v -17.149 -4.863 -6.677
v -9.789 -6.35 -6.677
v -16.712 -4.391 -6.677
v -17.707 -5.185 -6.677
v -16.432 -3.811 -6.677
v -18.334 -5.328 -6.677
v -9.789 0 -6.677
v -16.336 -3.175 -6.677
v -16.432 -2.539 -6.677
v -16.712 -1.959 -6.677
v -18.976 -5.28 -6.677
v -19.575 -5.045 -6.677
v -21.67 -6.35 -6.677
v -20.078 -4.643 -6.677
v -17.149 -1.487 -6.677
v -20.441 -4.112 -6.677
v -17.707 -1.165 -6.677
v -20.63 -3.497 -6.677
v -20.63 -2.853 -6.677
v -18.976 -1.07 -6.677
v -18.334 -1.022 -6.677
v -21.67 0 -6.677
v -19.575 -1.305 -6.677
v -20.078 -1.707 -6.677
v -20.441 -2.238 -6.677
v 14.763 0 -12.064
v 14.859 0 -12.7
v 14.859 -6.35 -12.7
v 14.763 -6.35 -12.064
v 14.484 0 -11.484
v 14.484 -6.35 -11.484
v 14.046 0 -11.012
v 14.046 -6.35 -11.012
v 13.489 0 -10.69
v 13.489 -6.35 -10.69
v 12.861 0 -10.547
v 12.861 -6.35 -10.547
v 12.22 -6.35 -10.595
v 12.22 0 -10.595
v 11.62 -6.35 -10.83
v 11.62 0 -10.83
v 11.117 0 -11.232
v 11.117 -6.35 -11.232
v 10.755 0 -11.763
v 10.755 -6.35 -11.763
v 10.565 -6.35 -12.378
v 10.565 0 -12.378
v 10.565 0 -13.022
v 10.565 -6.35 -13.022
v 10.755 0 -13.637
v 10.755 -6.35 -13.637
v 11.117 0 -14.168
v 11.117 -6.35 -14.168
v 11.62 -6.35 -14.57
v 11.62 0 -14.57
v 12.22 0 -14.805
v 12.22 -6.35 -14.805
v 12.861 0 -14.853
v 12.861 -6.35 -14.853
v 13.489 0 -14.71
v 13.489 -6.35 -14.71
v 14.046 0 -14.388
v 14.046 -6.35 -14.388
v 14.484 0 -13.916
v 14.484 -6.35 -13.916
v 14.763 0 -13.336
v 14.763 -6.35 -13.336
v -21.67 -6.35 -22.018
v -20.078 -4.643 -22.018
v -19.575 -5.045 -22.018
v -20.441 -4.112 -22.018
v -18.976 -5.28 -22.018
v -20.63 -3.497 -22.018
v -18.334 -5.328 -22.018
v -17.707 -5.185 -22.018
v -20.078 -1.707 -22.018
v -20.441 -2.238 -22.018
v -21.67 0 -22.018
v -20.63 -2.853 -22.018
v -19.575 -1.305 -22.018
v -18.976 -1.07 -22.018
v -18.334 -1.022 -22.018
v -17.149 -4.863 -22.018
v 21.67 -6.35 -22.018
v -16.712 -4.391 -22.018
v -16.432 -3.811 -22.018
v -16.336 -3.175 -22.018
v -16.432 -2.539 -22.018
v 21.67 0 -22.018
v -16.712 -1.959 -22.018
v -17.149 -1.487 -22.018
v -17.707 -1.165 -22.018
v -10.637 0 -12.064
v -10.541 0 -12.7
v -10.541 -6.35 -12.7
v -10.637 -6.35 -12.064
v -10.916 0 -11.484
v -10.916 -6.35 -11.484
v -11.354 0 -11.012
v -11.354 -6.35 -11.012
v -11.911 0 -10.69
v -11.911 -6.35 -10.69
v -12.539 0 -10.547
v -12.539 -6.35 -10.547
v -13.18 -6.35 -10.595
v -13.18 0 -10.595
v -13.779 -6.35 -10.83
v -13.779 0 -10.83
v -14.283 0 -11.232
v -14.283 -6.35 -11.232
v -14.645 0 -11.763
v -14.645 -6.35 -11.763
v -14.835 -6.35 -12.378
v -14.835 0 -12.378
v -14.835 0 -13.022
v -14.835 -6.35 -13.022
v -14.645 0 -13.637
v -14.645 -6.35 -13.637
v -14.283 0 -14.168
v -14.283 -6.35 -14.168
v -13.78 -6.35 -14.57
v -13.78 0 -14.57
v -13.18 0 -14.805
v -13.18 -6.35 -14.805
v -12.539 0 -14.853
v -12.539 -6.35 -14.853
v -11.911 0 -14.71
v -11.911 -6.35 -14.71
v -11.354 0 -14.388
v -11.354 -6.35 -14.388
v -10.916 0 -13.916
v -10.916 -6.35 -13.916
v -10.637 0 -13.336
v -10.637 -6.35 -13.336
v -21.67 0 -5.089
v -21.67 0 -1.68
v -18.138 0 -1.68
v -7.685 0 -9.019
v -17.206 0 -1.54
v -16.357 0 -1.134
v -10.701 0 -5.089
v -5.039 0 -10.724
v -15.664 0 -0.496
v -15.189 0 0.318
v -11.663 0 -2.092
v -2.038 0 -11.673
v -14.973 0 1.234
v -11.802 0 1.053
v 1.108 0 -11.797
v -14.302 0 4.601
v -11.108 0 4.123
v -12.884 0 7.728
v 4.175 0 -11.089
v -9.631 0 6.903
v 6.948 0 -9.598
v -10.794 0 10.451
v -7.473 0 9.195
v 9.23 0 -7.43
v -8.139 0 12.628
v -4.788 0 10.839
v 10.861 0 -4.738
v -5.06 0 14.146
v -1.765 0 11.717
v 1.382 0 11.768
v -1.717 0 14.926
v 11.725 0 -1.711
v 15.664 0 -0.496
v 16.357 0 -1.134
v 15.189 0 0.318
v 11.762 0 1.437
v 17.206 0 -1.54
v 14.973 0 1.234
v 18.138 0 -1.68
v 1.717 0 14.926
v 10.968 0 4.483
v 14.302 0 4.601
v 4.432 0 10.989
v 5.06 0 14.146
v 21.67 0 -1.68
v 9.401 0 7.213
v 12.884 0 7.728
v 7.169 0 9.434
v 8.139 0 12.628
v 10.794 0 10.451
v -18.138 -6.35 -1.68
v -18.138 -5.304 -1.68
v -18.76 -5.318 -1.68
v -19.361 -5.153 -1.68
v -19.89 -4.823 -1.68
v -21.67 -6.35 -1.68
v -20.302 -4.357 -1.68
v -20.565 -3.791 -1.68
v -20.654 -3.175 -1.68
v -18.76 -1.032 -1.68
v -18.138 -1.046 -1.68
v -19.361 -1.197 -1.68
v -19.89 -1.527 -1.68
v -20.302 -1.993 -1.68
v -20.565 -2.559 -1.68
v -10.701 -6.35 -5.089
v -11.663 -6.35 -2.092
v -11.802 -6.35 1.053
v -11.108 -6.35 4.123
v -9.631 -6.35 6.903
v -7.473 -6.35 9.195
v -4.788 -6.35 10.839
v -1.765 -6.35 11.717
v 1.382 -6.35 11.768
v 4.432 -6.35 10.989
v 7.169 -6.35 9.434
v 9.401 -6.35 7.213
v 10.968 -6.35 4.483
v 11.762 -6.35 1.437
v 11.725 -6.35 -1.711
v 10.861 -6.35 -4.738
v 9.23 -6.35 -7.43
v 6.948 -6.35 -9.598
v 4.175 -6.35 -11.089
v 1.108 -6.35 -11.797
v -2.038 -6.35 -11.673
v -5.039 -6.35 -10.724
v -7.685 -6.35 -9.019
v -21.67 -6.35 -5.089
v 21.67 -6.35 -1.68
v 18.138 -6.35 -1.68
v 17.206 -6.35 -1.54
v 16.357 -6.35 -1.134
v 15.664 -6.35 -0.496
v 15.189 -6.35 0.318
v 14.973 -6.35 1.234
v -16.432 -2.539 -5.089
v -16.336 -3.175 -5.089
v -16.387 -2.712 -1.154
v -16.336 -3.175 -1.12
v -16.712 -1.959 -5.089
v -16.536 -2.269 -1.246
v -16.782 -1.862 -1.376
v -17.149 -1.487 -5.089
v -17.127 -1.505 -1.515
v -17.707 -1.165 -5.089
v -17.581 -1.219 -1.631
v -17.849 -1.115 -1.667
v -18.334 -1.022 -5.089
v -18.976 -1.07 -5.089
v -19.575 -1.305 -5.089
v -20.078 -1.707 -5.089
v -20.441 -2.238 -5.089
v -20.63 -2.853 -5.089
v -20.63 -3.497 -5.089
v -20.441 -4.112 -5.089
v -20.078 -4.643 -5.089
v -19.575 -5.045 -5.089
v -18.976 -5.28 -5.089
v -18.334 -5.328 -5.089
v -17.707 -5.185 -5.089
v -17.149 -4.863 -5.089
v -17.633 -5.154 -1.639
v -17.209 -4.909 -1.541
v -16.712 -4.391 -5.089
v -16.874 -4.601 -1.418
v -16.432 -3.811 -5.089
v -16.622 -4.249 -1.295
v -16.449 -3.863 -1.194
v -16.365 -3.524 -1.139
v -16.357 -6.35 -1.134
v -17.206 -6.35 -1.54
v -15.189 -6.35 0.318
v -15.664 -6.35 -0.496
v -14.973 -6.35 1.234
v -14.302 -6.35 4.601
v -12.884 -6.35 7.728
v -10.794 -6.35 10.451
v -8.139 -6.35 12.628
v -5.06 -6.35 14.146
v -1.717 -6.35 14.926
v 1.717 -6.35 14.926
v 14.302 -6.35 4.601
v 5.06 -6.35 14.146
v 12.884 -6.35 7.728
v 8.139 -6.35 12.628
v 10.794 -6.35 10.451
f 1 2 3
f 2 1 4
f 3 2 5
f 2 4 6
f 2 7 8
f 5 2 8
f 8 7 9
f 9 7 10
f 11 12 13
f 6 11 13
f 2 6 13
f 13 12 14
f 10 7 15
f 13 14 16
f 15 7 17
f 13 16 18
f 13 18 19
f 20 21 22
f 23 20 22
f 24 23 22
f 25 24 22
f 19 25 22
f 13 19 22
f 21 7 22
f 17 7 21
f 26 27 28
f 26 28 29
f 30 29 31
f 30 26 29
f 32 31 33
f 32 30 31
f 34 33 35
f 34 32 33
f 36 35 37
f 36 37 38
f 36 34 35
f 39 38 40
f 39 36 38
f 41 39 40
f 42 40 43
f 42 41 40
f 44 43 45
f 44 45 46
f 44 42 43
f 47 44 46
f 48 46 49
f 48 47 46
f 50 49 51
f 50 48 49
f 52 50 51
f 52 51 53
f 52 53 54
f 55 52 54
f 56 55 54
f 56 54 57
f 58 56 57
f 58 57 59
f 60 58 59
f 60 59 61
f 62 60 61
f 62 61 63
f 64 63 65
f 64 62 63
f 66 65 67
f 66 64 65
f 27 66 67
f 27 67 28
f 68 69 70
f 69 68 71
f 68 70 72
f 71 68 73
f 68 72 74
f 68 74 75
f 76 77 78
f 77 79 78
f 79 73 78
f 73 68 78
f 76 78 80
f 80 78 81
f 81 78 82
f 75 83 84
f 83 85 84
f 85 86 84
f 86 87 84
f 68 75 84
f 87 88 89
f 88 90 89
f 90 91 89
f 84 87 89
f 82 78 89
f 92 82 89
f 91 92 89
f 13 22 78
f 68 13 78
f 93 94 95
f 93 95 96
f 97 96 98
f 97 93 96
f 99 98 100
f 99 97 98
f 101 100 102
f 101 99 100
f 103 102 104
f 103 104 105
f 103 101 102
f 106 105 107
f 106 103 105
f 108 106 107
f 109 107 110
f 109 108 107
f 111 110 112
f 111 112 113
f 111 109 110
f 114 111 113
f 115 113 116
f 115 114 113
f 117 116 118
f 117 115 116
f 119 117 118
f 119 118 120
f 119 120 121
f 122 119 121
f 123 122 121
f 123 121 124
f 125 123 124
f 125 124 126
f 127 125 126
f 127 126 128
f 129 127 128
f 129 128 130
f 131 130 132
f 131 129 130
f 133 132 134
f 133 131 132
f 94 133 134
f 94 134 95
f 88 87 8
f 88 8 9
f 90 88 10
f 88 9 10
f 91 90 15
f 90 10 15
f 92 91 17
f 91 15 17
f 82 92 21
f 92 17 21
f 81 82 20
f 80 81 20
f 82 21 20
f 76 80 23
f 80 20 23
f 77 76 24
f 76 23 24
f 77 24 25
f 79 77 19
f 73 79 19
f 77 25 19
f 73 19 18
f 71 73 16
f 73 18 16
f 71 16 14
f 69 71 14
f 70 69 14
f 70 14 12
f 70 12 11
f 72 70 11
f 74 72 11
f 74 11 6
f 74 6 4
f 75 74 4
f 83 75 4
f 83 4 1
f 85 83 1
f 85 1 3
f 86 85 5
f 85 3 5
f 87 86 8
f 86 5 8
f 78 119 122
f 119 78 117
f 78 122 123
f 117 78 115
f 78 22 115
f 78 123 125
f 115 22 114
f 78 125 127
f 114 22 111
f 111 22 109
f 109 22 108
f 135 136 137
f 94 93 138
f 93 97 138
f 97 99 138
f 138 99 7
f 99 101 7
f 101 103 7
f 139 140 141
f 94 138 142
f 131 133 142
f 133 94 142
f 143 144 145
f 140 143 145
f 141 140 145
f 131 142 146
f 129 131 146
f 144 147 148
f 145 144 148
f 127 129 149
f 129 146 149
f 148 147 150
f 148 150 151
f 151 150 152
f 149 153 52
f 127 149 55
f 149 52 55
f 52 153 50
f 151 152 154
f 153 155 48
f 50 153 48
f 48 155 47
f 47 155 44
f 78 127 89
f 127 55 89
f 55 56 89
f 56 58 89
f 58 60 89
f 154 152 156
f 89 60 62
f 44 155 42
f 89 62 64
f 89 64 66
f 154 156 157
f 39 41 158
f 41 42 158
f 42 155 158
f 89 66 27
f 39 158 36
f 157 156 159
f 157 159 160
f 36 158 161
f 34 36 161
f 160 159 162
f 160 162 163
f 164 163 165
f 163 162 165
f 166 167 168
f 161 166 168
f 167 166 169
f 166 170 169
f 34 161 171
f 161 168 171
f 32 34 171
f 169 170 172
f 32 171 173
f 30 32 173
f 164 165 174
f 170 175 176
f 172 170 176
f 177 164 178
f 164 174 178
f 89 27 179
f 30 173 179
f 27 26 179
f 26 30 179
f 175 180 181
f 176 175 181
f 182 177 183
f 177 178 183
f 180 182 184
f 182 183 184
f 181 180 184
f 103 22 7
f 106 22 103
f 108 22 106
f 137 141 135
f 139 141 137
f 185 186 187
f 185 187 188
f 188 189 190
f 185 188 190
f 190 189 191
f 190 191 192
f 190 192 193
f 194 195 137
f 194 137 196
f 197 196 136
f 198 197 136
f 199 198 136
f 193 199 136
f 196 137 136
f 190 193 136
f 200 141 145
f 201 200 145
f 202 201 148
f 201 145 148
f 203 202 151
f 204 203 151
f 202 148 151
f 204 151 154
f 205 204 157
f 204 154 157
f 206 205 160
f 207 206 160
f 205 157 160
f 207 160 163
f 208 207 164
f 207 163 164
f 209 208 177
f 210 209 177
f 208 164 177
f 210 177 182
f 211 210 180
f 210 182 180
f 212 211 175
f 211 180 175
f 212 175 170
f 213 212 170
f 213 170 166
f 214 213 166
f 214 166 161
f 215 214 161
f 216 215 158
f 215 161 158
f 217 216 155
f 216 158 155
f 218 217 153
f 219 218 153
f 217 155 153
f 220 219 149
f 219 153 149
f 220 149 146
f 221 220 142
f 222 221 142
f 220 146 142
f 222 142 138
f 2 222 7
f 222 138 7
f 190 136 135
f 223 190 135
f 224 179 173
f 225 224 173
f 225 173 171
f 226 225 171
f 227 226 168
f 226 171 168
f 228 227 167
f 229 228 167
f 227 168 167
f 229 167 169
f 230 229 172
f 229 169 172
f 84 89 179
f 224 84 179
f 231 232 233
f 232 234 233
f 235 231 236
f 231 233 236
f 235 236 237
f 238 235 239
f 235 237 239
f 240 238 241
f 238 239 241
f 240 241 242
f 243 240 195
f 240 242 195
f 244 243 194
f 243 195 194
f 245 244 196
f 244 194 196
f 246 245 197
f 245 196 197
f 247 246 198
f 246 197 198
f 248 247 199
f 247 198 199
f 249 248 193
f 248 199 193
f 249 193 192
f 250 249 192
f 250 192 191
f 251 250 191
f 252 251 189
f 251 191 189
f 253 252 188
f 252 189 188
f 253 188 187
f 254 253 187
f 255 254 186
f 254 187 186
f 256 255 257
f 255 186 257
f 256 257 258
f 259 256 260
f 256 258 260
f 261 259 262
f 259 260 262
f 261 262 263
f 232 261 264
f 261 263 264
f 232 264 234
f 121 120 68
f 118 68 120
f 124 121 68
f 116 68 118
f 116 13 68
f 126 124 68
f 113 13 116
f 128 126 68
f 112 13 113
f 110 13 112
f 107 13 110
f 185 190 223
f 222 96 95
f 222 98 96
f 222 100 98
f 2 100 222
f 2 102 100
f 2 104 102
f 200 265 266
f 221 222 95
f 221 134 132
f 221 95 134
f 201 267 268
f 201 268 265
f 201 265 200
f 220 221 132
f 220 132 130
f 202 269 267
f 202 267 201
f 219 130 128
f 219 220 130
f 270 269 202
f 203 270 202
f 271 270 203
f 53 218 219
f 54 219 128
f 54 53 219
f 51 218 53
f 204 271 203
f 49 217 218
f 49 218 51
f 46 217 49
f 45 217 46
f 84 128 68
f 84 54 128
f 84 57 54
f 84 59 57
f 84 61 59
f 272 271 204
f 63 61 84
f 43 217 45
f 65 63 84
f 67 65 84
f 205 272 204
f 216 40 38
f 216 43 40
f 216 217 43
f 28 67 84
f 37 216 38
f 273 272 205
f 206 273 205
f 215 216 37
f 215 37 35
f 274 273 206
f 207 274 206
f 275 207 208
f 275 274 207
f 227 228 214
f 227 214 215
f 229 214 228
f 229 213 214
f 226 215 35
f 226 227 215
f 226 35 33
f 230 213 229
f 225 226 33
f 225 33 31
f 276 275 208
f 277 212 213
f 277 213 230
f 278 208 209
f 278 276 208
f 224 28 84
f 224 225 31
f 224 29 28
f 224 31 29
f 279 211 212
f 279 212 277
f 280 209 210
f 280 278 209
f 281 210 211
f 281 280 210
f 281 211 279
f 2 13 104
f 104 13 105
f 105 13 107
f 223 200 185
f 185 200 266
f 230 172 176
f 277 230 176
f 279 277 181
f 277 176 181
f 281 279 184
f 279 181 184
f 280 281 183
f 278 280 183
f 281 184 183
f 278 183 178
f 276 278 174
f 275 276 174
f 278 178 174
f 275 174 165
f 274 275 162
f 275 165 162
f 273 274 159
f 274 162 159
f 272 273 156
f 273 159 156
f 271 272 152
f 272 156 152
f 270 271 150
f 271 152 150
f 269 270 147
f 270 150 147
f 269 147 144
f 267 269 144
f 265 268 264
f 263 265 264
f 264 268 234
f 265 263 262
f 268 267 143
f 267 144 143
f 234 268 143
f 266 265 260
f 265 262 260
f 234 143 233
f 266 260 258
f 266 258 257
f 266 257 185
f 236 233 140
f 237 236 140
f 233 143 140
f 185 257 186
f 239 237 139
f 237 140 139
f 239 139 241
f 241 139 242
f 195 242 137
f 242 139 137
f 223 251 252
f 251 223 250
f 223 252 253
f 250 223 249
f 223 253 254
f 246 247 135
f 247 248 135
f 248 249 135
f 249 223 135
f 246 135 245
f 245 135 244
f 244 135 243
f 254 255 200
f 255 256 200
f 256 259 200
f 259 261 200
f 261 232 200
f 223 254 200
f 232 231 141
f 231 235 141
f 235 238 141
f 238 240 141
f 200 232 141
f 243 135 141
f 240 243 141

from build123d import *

# Parameters (mm, degrees)
F0_R     = 2.159
F1_DEPTH = 6.35
F2_R     = 2.159
F3_DEPTH = 38.1


with BuildPart() as f1:
    # F0 (on Front) → F1 (new body)
    with BuildSketch(Plane.XZ):
        with BuildLine():
            ThreePointArc((-10.70052, -5.089209), (10.275417, 5.90059), (-9.788908, -6.676709))
            Line((-9.788908, -6.676709), (-21.670413, -6.676709))
            Line((-21.670413, -6.676709), (-21.670413, -22.018309))
            Line((-21.670413, -22.018309), (21.670413, -22.018309))
            Line((21.670413, -22.018309), (21.670413, -1.679891))
            Line((21.670413, -1.679891), (18.137582, -1.679891))
            ThreePointArc((18.137582, -1.679891), (15.986714, -0.840354), (14.973315, 1.234274))
            ThreePointArc((14.973315, 1.234274), (0, 15.0241), (-14.973315, 1.234274))
            ThreePointArc((-14.973315, 1.234274), (-15.986714, -0.840354), (-18.137582, -1.679891))
            Line((-18.137582, -1.679891), (-21.670413, -1.679891))
            Line((-21.670413, -1.679891), (-21.670413, -5.089209))
            Line((-21.670413, -5.089209), (-10.70052, -5.089209))
        make_face()
        with Locations((-12.7, -12.7)):
            Circle(F0_R, mode=Mode.SUBTRACT)
        with Locations((12.7, -12.7)):
            Circle(F0_R, mode=Mode.SUBTRACT)
    extrude(amount=F1_DEPTH)

    # F2 (on face) → F3 (cut, symmetric)
    with BuildSketch(Plane.XY.offset(-1.679891)):
        with Locations((-18.495413, -3.175)):
            Circle(F2_R)
    extrude(amount=F3_DEPTH, both=True, mode=Mode.SUBTRACT)


solid = f1.part
